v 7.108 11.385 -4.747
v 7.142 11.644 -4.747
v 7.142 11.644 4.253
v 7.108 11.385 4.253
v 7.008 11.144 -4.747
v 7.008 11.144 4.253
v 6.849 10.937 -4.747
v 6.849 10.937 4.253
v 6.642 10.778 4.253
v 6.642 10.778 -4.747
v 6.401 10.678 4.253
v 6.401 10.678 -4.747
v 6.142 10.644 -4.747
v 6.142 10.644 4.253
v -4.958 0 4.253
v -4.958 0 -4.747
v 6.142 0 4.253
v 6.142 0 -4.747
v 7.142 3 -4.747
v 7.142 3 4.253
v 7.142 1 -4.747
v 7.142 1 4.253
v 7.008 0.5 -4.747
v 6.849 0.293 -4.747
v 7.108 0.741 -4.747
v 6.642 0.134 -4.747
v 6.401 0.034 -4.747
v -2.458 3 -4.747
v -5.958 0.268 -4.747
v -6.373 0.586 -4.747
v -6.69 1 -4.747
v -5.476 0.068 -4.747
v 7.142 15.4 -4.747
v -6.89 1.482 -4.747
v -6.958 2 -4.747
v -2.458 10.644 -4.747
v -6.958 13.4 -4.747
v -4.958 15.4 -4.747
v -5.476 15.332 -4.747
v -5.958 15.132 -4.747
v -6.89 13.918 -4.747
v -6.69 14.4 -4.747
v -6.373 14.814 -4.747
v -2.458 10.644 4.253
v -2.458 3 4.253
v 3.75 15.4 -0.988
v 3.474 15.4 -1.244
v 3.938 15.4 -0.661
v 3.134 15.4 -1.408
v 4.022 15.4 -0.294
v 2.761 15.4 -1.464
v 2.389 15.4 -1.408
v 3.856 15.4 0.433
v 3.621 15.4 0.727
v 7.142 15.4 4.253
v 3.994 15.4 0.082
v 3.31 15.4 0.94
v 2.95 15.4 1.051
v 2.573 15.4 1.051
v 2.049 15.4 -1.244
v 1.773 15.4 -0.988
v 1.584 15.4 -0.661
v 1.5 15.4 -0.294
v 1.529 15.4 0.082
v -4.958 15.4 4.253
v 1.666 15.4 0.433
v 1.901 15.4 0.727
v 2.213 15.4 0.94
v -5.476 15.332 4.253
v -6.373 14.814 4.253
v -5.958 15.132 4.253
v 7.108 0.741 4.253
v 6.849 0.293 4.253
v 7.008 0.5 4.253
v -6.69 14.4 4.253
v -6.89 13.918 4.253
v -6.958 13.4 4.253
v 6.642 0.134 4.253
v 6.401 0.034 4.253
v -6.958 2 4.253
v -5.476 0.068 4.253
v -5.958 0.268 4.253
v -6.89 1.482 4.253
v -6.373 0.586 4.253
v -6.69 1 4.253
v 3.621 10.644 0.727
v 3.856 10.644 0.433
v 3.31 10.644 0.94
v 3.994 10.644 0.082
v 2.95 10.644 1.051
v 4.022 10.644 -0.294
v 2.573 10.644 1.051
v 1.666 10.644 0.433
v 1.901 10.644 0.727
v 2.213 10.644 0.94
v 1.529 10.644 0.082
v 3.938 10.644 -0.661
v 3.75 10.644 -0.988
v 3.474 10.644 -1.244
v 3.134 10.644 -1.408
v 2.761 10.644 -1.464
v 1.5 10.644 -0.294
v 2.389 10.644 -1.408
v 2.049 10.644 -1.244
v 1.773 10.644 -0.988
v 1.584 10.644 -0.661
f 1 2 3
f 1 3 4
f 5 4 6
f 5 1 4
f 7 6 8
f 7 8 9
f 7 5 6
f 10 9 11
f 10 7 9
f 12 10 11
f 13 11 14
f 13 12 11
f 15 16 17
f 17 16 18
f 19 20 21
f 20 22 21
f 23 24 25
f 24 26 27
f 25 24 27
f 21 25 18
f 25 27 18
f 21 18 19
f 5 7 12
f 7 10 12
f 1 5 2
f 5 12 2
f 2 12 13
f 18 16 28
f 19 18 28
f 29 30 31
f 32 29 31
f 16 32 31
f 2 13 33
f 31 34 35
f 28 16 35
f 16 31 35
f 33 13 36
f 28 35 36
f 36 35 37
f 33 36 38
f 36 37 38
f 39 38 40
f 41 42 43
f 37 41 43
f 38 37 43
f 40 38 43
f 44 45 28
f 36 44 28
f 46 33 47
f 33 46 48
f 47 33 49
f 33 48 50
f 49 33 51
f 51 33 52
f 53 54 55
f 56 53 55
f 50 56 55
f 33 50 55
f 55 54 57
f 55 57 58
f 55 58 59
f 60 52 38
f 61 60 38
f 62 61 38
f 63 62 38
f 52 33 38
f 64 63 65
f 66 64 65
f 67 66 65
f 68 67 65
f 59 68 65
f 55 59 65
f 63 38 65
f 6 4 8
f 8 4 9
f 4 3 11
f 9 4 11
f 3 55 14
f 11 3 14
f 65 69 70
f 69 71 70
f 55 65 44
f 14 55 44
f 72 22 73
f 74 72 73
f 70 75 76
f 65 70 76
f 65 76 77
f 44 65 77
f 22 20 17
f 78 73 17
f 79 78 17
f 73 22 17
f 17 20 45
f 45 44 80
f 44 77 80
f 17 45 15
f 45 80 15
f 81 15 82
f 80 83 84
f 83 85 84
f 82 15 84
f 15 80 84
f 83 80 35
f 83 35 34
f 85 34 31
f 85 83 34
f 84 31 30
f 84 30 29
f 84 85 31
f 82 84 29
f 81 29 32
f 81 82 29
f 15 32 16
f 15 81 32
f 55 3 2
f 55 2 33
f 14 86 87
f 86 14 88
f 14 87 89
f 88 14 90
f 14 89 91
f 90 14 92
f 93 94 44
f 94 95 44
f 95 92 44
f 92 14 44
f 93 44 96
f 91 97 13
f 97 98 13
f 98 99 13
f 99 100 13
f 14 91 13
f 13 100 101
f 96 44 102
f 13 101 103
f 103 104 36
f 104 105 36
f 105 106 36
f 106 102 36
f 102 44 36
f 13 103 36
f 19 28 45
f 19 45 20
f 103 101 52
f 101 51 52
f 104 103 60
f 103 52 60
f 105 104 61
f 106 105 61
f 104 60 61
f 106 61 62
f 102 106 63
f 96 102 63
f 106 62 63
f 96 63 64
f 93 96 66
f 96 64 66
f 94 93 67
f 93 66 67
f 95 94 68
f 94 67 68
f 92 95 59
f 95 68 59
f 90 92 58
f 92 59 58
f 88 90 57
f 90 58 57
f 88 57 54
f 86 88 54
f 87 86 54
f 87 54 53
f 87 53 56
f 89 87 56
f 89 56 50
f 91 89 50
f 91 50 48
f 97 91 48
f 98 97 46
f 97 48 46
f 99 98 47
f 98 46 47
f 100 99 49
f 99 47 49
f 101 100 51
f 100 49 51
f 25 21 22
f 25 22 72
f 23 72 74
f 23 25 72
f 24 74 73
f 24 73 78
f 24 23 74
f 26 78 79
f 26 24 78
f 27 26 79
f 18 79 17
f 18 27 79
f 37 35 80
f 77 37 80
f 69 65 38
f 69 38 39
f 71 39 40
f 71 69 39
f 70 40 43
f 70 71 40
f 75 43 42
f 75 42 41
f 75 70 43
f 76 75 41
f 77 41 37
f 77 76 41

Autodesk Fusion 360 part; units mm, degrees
sketch "Sketch1" plane through (0, 0, 0) normal (0, 1, 0) x (1, 0, 0)
  line L0 (-6.9583, -4.2531) -> (7.1417, -4.2531)
  line L1 (7.1417, -4.2531) -> (7.1417, 4.7469)
  line L2 (7.1417, 4.7469) -> (-6.9583, 4.7469)
  line L3 (-6.9583, 4.7469) -> (-6.9583, -4.2531)
  line L4 (-6.9583, -4.2531) -> (-2.4583, -4.2531)
  line L5 (-2.4583, -4.2531) -> (-2.4583, 4.7469)
  line L6 (-2.4583, 4.7469) -> (-6.9583, 4.7469)
  line L7 (-6.9583, 4.7469) -> (-6.9583, -4.2531)
  dimension "d4" = 14.1
  dimension "d5" = 9
  dimension "d7" = 4.5
  dimension "d8" = 9
extrude "Extrude1" add sketch "Sketch1" along normal blind 15.4 contours L0 L2 L3 L4 L5 L6 L7
extrude "Extrude2" add sketch "Sketch1" along normal blind 3 contours L0 L1 L2 L5
sketch "Sketch2" plane through (-2.4583, 0, 0) normal (1, 0, 0) x (0, 1, 0)
  line L0 (3, 4.2531) -> (3, -4.7469)
  line L1 (3, -4.7469) -> (15.4, -4.7469)
  line L2 (15.4, -4.7469) -> (15.4, 4.2531)
  line L3 (15.4, 4.2531) -> (3, 4.2531)
  line L4 (3, -0.2469) -> (10.4, -0.2469)
  line L5 (15.4, 4.2531) -> (10.6439, 4.2531)
  line L6 (10.6439, 4.2531) -> (10.6439, -4.7469)
  line L7 (10.6439, -4.7469) -> (15.4, -4.7469)
  line L8 (15.4, -4.7469) -> (15.4, 4.2531)
  dimension "d16" = 7.4
extrude "Extrude3" add sketch "Sketch2" along normal blind 9.6 contours L1 L2 L3 L5 L6 L7 L8
hole "Hole1" at (2.7613, 10.6439, -0.1995) direction (0, 1, 0) diameter 2.529 end through all
fillet "Fillet1" radius 2 1 edges at (-6.9583, 15.4, -0.2469)
fillet "Fillet2" radius 2 1 edges at (-6.9583, 0, -0.2469)
fillet "Fillet3" radius 1 1 edges at (7.1417, 10.6439, -0.2469)
fillet "Fillet4" radius 1 1 edges at (7.1417, 0, -0.2469)
equation "clamp_w = 14.1 mm"
equation "clamp_l = 9 mm"
equation "clamp_bot_thickness = 3 mm"
equation "d4 = clamp_w"
equation "d5 = clamp_l"
equation "clamp_mid_w = 4.5 mm"
equation "d7 = clamp_mid_w"
equation "d8 = clamp_l"
equation "clamp_mid_thickness = wp_gap + clamp_bot_thickness + clamp_top_thickness"
equation "d10 = clamp_mid_thickness"
equation "d12 = clamp_bot_thickness"
equation "clamp_top_thickness = 5 mm"
equation "wp_gap = 7.4 mm"
equation "d16 = wp_gap"
equation "top_clamp_depth = clamp_w - clamp_mid_w"
equation "d18 = top_clamp_depth"
